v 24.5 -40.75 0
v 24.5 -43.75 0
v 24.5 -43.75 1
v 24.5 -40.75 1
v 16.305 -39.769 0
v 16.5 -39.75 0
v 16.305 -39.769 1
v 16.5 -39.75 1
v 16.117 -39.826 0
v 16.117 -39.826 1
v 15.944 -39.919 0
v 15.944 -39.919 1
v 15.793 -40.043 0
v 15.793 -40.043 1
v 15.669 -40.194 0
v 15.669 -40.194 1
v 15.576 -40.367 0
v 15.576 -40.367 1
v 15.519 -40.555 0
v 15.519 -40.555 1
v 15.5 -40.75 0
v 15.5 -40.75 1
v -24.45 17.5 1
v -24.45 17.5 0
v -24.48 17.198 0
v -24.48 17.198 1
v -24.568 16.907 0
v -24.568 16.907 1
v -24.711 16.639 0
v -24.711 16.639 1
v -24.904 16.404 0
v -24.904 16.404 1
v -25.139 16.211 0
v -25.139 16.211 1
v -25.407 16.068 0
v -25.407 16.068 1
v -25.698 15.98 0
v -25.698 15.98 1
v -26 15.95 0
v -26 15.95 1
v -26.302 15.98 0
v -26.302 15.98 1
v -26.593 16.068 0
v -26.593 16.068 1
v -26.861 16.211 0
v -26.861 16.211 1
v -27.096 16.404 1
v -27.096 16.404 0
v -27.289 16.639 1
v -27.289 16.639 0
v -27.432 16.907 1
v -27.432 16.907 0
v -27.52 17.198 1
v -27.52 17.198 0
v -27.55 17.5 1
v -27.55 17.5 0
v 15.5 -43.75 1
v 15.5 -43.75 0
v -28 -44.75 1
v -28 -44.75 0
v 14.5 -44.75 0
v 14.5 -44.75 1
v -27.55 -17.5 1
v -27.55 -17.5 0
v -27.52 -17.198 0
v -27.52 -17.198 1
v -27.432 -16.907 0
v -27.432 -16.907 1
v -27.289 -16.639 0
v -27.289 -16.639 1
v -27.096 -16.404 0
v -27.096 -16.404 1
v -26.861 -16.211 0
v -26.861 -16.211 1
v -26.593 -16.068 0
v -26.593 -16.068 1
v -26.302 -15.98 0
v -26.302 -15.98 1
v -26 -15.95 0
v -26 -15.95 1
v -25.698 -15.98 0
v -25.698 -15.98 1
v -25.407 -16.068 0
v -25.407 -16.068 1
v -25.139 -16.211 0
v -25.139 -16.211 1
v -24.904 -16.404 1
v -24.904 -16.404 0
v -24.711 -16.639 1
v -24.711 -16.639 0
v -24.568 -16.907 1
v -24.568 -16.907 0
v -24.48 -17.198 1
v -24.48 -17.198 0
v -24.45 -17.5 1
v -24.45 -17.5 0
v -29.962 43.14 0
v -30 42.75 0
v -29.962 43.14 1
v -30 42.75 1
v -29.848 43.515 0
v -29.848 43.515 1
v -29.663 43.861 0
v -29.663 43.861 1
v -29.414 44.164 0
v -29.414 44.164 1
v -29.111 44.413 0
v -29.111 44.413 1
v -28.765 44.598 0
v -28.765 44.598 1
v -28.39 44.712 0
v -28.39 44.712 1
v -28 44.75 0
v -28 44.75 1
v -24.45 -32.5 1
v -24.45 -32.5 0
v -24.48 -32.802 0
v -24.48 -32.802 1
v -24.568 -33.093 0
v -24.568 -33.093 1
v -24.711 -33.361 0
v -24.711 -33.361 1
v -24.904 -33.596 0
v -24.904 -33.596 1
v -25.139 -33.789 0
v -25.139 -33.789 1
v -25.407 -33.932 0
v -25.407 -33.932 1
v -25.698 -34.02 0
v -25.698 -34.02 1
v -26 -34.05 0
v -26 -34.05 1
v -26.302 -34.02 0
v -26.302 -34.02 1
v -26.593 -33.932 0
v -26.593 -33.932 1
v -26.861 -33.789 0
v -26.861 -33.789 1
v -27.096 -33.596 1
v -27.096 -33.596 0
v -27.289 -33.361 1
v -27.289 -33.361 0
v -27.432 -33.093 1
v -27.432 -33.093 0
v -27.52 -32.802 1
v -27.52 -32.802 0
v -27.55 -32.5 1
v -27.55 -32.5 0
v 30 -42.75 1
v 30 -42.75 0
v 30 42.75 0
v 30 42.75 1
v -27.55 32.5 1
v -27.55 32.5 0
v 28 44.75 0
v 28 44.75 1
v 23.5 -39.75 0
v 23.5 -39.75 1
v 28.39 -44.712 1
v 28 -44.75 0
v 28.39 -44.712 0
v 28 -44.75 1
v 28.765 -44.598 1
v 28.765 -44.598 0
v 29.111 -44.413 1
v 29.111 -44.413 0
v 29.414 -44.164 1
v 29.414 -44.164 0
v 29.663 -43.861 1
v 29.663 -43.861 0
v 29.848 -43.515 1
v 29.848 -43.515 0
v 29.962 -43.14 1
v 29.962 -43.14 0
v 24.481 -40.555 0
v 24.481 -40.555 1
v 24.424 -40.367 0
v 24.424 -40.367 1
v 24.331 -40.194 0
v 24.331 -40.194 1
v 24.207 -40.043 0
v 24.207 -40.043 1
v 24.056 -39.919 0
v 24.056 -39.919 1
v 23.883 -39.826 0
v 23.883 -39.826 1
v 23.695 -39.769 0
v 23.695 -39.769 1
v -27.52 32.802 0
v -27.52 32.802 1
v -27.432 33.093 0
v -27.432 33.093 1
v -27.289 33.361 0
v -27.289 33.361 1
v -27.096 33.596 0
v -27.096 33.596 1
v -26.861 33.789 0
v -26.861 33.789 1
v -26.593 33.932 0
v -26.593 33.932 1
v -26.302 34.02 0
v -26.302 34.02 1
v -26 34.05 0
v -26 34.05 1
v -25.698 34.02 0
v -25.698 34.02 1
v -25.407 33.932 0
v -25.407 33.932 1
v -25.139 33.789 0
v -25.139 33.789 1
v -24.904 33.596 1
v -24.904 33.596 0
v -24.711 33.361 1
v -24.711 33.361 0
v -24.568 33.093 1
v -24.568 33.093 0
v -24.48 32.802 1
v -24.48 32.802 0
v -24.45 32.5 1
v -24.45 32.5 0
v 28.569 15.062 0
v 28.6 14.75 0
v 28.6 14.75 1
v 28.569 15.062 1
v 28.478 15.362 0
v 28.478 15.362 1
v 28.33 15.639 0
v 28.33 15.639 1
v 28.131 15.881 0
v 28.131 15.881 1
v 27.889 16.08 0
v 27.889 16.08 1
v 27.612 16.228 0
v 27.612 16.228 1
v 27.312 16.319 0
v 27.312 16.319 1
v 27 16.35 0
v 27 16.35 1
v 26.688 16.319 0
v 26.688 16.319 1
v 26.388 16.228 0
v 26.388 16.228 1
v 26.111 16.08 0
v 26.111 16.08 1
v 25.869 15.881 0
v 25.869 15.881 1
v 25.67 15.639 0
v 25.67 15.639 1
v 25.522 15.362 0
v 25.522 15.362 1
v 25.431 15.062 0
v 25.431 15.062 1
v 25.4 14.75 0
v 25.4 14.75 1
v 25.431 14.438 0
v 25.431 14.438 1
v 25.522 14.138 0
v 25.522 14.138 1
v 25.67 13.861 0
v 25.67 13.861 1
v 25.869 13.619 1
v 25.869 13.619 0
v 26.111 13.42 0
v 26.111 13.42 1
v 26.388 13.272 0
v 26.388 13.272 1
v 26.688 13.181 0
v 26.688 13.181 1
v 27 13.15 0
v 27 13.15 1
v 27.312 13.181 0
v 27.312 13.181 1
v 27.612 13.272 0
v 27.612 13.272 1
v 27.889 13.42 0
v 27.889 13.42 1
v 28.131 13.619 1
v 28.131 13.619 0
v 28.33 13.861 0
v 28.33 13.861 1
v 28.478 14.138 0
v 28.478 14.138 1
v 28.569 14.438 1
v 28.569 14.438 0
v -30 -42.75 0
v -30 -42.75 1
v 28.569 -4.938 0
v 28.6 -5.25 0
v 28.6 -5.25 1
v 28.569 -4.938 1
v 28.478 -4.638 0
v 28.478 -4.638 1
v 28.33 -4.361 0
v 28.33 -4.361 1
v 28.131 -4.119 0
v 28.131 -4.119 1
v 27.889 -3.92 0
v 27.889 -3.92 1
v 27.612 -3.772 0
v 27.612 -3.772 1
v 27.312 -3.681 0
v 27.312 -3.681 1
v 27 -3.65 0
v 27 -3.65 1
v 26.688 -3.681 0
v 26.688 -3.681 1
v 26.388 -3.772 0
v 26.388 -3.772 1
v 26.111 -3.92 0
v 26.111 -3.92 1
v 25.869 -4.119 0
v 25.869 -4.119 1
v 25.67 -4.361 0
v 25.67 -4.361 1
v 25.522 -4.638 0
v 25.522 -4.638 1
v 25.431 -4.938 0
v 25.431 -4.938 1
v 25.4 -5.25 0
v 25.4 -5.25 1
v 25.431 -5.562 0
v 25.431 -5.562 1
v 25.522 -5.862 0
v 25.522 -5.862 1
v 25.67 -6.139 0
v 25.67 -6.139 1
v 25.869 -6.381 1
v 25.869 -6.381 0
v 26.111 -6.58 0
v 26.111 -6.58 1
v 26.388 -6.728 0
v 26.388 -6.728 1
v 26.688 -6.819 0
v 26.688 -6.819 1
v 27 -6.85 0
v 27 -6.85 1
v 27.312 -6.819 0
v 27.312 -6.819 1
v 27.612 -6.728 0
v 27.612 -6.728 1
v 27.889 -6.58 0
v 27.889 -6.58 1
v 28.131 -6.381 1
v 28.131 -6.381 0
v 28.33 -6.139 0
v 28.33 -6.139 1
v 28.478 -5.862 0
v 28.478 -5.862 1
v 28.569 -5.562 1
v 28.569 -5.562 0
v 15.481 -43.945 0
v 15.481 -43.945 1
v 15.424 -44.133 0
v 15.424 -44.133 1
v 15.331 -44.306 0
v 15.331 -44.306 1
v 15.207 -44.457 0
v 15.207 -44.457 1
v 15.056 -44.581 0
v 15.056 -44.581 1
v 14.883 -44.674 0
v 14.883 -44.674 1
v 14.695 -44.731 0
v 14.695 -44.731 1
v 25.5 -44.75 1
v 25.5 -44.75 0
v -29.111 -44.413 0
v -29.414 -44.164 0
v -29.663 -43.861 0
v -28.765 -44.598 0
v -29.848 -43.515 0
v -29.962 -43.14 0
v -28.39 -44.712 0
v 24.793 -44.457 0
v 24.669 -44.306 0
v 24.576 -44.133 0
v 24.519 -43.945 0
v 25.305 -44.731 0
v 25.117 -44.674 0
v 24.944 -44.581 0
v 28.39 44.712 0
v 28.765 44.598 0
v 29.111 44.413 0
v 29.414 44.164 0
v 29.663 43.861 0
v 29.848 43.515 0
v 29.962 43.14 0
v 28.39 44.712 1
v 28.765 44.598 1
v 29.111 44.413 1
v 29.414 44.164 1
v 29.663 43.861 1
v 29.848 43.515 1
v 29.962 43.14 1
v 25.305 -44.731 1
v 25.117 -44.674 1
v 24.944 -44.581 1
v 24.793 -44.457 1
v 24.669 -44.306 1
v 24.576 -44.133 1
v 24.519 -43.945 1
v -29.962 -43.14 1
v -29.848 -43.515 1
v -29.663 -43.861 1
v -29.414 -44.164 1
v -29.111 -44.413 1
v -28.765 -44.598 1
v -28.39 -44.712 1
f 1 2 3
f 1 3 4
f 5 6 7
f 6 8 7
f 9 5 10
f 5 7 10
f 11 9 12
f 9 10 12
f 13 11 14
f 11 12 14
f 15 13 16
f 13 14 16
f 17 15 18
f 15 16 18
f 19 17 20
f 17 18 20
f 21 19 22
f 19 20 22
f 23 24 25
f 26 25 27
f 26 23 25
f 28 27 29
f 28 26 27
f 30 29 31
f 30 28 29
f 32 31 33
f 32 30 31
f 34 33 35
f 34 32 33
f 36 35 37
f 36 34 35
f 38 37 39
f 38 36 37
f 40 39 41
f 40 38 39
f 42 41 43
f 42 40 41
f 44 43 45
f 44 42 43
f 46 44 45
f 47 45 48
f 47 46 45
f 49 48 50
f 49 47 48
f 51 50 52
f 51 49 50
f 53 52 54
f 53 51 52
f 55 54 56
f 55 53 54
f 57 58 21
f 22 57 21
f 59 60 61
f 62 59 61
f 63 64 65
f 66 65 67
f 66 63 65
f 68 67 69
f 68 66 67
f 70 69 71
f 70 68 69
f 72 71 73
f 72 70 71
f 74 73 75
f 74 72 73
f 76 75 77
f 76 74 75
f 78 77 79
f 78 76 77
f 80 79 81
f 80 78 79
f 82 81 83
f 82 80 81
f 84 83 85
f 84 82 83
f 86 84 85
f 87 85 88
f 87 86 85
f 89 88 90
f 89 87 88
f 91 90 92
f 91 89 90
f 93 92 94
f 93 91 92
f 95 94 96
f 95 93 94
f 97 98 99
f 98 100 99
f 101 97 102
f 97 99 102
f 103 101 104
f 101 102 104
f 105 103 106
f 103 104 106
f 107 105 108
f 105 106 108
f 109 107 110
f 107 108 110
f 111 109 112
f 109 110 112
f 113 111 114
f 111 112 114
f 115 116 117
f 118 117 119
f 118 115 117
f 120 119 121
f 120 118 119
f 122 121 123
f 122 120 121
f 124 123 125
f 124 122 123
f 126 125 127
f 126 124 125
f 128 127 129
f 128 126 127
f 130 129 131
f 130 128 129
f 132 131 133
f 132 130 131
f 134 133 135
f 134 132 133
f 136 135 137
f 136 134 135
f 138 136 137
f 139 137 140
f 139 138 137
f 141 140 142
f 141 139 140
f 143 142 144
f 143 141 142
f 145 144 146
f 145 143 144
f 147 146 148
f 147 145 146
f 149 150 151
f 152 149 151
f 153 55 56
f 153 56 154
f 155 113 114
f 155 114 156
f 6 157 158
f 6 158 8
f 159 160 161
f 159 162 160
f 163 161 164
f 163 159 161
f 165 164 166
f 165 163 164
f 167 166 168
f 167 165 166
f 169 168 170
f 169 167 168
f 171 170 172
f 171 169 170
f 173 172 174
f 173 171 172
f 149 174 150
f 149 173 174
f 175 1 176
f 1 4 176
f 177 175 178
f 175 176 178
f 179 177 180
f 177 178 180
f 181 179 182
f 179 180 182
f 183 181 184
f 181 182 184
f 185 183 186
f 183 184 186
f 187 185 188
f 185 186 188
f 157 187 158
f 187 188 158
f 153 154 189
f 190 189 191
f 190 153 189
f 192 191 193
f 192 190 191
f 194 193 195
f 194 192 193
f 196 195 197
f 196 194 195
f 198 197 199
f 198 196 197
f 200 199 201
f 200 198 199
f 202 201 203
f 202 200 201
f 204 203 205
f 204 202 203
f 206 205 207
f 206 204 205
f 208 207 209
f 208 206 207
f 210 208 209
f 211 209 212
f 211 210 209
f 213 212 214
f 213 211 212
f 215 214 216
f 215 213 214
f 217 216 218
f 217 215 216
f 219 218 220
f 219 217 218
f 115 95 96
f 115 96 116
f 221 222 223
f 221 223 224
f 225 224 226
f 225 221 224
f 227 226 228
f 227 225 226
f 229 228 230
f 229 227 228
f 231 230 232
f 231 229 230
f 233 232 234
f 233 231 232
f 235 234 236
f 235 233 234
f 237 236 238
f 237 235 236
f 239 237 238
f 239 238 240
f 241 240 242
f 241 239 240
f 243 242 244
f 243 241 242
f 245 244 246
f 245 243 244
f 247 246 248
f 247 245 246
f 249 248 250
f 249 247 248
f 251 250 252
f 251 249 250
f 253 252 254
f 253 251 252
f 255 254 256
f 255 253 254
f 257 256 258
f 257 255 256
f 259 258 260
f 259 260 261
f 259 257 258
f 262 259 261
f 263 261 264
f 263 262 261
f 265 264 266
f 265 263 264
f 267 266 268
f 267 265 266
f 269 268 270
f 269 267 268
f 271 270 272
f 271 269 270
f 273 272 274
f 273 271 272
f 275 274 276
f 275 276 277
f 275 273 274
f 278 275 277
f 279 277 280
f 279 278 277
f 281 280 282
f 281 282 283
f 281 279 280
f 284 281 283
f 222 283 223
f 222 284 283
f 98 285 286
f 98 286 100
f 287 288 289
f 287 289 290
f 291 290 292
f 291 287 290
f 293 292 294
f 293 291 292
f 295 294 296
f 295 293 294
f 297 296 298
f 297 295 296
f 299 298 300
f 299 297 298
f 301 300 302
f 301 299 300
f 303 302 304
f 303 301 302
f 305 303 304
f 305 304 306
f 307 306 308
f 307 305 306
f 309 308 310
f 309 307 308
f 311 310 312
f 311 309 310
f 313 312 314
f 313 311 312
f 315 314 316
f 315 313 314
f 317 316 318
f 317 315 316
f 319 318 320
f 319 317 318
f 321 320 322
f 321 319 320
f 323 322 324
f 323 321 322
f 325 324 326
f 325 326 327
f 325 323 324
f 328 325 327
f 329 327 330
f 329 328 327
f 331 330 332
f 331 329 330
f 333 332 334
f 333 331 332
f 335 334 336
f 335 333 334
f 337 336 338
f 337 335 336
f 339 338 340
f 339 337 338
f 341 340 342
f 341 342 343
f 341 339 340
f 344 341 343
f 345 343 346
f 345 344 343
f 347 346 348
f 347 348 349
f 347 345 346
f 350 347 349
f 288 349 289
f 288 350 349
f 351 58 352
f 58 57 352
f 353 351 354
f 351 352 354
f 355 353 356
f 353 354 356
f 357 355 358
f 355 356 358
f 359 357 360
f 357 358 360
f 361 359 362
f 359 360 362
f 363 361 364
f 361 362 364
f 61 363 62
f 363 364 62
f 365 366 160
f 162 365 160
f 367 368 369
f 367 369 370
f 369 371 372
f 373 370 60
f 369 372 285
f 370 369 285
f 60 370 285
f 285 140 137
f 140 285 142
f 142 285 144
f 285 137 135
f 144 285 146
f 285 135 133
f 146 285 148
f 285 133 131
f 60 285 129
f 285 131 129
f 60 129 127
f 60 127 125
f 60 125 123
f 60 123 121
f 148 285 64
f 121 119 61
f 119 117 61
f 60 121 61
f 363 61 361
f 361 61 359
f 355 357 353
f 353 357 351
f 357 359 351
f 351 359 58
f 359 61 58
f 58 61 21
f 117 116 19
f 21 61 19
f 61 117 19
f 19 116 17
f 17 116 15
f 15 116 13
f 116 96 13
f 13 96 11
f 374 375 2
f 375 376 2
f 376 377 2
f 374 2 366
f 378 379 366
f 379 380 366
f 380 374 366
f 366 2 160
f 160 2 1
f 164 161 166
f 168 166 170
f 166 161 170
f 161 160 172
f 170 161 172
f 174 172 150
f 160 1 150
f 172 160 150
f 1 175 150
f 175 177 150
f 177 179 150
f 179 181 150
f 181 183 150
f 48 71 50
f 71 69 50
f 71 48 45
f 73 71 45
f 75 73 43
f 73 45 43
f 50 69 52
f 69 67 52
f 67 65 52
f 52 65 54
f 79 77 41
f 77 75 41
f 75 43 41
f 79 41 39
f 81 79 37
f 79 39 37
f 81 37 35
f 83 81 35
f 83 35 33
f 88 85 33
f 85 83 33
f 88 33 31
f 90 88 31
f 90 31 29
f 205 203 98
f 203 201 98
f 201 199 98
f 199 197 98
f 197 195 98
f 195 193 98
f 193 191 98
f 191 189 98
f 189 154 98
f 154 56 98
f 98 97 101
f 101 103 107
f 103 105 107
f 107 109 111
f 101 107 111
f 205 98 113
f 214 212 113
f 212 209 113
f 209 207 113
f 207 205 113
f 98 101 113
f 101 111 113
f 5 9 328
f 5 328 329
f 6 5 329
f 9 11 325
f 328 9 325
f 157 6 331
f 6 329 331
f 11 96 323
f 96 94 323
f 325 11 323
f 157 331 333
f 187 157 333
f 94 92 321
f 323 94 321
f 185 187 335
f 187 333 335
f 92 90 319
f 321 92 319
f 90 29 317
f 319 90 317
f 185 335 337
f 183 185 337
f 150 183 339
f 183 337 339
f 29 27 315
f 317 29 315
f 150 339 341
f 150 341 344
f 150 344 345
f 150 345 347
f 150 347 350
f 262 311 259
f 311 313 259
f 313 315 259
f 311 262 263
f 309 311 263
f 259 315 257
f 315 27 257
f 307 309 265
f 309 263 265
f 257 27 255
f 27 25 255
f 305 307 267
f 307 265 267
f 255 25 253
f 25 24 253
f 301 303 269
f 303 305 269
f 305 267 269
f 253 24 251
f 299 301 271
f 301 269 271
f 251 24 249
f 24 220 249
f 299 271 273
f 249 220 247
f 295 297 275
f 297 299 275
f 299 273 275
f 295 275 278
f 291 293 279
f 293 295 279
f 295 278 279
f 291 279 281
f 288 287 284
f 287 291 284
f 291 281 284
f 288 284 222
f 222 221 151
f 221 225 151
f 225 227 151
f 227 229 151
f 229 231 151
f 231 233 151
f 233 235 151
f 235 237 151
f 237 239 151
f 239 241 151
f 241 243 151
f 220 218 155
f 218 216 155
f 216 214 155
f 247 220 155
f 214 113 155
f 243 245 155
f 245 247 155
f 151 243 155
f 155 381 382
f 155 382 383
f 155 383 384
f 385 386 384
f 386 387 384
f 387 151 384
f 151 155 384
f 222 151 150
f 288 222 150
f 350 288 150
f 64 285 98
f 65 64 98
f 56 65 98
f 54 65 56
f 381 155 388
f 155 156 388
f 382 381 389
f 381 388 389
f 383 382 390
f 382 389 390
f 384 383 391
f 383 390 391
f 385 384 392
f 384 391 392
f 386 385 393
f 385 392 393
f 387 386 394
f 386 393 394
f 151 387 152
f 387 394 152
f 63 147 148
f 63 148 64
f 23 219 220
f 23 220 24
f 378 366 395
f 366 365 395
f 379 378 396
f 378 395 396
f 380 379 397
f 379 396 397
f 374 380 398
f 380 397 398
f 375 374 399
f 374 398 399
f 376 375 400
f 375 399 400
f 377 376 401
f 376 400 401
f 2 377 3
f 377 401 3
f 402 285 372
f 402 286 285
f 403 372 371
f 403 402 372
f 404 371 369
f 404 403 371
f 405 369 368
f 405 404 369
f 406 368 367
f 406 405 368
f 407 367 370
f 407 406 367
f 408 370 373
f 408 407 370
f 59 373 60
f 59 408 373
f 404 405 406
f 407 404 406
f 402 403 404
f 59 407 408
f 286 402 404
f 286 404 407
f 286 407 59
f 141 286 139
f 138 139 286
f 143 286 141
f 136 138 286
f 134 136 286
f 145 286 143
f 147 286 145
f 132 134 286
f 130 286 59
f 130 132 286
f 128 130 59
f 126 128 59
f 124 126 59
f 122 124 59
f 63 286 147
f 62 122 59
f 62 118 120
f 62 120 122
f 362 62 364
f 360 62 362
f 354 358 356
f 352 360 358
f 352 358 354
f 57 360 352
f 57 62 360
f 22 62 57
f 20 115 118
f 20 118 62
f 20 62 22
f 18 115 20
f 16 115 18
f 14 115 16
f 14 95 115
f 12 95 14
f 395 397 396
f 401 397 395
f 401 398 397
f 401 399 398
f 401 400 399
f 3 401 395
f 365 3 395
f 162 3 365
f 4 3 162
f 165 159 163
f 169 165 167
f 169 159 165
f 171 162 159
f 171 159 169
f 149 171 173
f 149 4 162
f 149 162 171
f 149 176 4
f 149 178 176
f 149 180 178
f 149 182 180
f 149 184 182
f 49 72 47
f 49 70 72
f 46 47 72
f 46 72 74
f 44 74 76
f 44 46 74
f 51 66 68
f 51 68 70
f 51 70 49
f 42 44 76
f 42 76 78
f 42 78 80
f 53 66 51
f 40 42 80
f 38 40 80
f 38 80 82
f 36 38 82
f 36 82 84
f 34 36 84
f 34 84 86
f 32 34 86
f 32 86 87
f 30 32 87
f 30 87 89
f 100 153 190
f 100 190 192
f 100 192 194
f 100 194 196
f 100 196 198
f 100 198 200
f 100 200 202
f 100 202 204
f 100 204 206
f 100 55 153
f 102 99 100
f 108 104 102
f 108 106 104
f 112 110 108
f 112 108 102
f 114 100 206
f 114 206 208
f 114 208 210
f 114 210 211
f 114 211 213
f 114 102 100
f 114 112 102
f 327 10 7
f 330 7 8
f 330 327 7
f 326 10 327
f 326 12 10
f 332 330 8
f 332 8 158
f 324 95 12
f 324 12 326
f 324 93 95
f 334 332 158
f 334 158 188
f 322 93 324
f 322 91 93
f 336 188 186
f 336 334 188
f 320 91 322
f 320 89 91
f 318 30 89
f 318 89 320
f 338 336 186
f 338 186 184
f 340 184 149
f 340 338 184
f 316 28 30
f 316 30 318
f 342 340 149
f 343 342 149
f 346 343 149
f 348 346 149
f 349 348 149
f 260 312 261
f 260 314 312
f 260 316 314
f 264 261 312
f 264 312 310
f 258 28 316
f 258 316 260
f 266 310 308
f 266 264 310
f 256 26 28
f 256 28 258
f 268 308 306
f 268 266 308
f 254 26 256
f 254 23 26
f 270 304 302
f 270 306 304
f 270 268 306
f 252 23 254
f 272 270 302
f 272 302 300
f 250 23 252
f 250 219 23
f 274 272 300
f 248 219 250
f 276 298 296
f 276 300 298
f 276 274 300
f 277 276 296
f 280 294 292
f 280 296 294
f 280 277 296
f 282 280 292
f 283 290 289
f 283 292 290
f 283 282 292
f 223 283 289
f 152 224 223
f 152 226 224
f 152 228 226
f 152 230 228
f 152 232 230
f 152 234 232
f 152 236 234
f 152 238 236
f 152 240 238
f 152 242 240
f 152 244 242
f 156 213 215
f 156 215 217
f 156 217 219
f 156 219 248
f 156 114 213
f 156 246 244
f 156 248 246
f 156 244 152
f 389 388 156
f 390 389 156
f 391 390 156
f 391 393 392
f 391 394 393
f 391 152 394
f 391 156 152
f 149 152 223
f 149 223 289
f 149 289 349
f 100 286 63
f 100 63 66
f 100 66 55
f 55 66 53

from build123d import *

# Parameters (mm, degrees)
SKETCH_1_W          = 60
SKETCH_1_H          = 89.5
SKETCH_1_R          = 1.6
EXTRUDE_1_DEPTH     = 1
CUT_EXTRUDE_1_DEPTH = 10
FILLET_1_R          = 2
SKETCH_3_W          = 9
SKETCH_3_H          = 10
CUT_EXTRUDE_2_DEPTH = 10
FILLET_2_R          = 1


with BuildPart() as part:
    # 草图1 → 凸台-拉伸1 (new body)
    with BuildSketch(Plane.XY):
        Rectangle(SKETCH_1_W, SKETCH_1_H)
        with Locations((27, 14.75)):
            Circle(SKETCH_1_R, mode=Mode.SUBTRACT)
        with Locations((27, -5.25)):
            Circle(SKETCH_1_R, mode=Mode.SUBTRACT)
    extrude(amount=EXTRUDE_1_DEPTH)

    # 草图2 → 切除-拉伸1 (cut)
    with BuildSketch(Plane.XY.offset(1)):
        with BuildLine():
            Line((-24.45, 32.5), (-24.45, 17.5))
            ThreePointArc((-24.45, 17.5), (-26, 15.95), (-27.55, 17.5))
            Line((-27.55, 17.5), (-27.55, 32.5))
            ThreePointArc((-27.55, 32.5), (-26, 34.05), (-24.45, 32.5))
        make_face()
        with BuildLine():
            Line((-24.45, -17.5), (-24.45, -32.5))
            ThreePointArc((-24.45, -32.5), (-26, -34.05), (-27.55, -32.5))
            Line((-27.55, -32.5), (-27.55, -17.5))
            ThreePointArc((-27.55, -17.5), (-26, -15.95), (-24.45, -17.5))
        make_face()
    extrude(amount=-CUT_EXTRUDE_1_DEPTH, mode=Mode.SUBTRACT)

    # 圆角1
    fillet_1_edges = [part.edges().sort_by_distance(p)[0] for p in [
        (30, -44.75, 0.5),
        (-30, -44.75, 0.5),
        (-30, 44.75, 0.5),
        (30, 44.75, 0.5),
    ]]
    fillet(fillet_1_edges, radius=FILLET_1_R)

    # 草图3 → 切除-拉伸2 (cut)
    with BuildSketch(Plane(origin=(0, 0, 0), x_dir=(-1, 0, 0), z_dir=(0, 0, -1))):
        with Locations((-20, -44.75)):
            Rectangle(SKETCH_3_W, SKETCH_3_H)
    extrude(amount=-CUT_EXTRUDE_2_DEPTH, mode=Mode.SUBTRACT)

    # 圆角2
    fillet_2_edges = [part.edges().sort_by_distance(p)[0] for p in [
        (24.5, -44.75, 0.5),
        (15.5, -44.75, 0.5),
        (24.5, -39.75, 0.5),
        (15.5, -39.75, 0.5),
    ]]
    fillet(fillet_2_edges, radius=FILLET_2_R)


solid = part.part
